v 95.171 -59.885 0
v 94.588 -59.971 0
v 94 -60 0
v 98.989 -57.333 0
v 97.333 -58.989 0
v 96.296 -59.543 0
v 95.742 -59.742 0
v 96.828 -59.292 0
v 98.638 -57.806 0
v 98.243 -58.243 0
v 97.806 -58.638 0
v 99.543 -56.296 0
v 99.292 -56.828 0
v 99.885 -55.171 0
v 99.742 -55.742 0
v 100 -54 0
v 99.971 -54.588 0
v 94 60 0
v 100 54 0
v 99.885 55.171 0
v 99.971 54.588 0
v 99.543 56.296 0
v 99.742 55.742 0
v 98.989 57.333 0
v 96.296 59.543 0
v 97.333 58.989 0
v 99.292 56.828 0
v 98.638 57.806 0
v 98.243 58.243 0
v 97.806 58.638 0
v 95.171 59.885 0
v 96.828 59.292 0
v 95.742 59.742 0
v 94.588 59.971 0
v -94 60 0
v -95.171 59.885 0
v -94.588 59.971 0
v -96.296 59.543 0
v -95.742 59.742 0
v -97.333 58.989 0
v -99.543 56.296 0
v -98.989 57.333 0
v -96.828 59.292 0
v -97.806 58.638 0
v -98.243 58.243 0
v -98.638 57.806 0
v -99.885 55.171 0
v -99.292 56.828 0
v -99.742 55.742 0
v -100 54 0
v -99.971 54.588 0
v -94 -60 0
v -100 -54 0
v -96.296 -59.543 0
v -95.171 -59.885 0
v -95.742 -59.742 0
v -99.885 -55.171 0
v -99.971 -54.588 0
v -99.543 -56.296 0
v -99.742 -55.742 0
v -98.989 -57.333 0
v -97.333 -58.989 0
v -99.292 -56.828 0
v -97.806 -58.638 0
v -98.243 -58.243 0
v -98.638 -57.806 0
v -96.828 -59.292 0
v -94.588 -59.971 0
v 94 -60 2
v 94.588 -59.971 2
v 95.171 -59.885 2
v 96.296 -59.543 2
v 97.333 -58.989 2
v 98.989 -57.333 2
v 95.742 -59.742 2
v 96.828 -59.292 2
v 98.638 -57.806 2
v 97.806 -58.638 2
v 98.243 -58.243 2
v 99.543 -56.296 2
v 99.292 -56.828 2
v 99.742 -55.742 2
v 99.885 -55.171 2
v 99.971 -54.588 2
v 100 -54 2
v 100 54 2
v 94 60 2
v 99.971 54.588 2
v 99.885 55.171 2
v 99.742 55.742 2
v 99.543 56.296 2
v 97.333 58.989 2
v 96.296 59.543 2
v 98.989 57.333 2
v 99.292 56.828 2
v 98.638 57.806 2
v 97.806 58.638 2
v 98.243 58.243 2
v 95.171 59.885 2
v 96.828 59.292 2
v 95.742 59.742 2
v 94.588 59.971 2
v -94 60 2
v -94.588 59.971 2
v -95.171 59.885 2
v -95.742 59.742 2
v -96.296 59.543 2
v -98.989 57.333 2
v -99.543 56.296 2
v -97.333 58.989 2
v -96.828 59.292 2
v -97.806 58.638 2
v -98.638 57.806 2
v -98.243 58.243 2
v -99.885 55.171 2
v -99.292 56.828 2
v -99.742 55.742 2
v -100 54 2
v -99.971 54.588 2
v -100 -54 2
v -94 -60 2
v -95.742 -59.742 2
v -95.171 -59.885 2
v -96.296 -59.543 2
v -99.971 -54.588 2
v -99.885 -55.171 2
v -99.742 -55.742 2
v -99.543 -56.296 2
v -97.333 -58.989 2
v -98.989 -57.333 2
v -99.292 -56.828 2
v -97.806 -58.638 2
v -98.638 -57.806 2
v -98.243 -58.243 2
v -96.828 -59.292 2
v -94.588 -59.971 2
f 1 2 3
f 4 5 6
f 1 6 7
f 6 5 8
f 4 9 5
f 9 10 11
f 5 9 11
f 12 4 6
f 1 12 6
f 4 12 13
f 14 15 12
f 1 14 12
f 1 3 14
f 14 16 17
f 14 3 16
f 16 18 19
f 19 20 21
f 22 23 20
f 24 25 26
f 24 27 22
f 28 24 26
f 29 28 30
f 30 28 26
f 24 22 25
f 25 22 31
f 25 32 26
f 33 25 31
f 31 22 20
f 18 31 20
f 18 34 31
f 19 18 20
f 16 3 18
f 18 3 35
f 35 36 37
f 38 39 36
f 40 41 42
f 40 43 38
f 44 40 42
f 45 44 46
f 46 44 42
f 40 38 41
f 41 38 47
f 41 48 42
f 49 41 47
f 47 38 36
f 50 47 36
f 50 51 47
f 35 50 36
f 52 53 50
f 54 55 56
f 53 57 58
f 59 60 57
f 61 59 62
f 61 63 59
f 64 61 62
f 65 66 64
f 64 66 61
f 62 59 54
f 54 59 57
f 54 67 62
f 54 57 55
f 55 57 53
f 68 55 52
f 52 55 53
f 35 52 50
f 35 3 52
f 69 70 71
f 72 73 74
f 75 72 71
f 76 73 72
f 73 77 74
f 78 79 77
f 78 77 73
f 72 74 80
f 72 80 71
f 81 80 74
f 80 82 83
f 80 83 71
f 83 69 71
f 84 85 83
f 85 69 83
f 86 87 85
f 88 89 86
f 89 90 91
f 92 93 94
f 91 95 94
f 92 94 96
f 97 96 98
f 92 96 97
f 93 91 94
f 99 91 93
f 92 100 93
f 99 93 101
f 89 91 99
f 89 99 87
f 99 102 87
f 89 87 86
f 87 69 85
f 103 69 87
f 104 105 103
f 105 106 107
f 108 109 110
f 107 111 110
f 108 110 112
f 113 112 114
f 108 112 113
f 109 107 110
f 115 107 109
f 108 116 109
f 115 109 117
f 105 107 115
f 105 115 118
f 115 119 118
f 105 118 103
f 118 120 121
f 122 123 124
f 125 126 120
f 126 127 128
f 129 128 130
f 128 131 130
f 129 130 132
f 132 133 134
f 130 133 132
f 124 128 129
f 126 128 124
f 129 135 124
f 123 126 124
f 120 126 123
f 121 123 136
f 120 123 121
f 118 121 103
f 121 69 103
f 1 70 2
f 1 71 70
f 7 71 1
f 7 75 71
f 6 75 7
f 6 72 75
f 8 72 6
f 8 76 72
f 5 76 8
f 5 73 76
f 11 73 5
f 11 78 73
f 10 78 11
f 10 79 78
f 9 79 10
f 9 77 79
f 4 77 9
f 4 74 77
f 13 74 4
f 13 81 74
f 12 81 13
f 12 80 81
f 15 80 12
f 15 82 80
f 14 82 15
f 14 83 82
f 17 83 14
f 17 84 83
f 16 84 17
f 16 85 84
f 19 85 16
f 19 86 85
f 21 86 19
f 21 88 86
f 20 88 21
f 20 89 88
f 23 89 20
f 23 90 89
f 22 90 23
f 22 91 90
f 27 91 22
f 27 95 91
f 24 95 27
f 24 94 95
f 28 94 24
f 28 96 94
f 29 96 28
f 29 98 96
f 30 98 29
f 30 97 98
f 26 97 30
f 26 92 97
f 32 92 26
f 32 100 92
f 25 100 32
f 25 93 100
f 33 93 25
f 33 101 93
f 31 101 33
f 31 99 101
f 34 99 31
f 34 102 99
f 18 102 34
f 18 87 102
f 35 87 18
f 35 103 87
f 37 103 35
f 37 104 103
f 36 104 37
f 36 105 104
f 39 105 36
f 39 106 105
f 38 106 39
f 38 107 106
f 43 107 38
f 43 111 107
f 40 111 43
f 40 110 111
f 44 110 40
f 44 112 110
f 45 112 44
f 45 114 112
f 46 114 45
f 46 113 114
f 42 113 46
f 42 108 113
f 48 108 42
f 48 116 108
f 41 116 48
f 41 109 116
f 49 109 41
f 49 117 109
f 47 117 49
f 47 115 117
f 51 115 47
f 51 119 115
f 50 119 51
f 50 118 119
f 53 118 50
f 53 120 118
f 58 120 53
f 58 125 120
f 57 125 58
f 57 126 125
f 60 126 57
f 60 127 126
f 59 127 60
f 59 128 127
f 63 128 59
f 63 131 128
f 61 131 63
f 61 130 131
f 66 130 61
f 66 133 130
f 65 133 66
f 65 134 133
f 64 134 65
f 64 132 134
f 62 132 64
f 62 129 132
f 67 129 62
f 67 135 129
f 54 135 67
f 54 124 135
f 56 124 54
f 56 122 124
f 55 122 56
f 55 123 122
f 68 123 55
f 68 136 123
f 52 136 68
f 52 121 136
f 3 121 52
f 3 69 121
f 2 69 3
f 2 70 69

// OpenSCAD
$fn = 64;

length = 200;
width  = 120;
thickness = 2;

corner_radius = 6;

module rounded_sheet(l, w, t, r){
    r2 = min(r, min(l, w)/2);
    linear_extrude(height = t)
        offset(r = r2)
            square([l - 2*r2, w - 2*r2], center = true);
}

color([0.08, 0.08, 0.09])
rounded_sheet(length, width, thickness, corner_radius);
